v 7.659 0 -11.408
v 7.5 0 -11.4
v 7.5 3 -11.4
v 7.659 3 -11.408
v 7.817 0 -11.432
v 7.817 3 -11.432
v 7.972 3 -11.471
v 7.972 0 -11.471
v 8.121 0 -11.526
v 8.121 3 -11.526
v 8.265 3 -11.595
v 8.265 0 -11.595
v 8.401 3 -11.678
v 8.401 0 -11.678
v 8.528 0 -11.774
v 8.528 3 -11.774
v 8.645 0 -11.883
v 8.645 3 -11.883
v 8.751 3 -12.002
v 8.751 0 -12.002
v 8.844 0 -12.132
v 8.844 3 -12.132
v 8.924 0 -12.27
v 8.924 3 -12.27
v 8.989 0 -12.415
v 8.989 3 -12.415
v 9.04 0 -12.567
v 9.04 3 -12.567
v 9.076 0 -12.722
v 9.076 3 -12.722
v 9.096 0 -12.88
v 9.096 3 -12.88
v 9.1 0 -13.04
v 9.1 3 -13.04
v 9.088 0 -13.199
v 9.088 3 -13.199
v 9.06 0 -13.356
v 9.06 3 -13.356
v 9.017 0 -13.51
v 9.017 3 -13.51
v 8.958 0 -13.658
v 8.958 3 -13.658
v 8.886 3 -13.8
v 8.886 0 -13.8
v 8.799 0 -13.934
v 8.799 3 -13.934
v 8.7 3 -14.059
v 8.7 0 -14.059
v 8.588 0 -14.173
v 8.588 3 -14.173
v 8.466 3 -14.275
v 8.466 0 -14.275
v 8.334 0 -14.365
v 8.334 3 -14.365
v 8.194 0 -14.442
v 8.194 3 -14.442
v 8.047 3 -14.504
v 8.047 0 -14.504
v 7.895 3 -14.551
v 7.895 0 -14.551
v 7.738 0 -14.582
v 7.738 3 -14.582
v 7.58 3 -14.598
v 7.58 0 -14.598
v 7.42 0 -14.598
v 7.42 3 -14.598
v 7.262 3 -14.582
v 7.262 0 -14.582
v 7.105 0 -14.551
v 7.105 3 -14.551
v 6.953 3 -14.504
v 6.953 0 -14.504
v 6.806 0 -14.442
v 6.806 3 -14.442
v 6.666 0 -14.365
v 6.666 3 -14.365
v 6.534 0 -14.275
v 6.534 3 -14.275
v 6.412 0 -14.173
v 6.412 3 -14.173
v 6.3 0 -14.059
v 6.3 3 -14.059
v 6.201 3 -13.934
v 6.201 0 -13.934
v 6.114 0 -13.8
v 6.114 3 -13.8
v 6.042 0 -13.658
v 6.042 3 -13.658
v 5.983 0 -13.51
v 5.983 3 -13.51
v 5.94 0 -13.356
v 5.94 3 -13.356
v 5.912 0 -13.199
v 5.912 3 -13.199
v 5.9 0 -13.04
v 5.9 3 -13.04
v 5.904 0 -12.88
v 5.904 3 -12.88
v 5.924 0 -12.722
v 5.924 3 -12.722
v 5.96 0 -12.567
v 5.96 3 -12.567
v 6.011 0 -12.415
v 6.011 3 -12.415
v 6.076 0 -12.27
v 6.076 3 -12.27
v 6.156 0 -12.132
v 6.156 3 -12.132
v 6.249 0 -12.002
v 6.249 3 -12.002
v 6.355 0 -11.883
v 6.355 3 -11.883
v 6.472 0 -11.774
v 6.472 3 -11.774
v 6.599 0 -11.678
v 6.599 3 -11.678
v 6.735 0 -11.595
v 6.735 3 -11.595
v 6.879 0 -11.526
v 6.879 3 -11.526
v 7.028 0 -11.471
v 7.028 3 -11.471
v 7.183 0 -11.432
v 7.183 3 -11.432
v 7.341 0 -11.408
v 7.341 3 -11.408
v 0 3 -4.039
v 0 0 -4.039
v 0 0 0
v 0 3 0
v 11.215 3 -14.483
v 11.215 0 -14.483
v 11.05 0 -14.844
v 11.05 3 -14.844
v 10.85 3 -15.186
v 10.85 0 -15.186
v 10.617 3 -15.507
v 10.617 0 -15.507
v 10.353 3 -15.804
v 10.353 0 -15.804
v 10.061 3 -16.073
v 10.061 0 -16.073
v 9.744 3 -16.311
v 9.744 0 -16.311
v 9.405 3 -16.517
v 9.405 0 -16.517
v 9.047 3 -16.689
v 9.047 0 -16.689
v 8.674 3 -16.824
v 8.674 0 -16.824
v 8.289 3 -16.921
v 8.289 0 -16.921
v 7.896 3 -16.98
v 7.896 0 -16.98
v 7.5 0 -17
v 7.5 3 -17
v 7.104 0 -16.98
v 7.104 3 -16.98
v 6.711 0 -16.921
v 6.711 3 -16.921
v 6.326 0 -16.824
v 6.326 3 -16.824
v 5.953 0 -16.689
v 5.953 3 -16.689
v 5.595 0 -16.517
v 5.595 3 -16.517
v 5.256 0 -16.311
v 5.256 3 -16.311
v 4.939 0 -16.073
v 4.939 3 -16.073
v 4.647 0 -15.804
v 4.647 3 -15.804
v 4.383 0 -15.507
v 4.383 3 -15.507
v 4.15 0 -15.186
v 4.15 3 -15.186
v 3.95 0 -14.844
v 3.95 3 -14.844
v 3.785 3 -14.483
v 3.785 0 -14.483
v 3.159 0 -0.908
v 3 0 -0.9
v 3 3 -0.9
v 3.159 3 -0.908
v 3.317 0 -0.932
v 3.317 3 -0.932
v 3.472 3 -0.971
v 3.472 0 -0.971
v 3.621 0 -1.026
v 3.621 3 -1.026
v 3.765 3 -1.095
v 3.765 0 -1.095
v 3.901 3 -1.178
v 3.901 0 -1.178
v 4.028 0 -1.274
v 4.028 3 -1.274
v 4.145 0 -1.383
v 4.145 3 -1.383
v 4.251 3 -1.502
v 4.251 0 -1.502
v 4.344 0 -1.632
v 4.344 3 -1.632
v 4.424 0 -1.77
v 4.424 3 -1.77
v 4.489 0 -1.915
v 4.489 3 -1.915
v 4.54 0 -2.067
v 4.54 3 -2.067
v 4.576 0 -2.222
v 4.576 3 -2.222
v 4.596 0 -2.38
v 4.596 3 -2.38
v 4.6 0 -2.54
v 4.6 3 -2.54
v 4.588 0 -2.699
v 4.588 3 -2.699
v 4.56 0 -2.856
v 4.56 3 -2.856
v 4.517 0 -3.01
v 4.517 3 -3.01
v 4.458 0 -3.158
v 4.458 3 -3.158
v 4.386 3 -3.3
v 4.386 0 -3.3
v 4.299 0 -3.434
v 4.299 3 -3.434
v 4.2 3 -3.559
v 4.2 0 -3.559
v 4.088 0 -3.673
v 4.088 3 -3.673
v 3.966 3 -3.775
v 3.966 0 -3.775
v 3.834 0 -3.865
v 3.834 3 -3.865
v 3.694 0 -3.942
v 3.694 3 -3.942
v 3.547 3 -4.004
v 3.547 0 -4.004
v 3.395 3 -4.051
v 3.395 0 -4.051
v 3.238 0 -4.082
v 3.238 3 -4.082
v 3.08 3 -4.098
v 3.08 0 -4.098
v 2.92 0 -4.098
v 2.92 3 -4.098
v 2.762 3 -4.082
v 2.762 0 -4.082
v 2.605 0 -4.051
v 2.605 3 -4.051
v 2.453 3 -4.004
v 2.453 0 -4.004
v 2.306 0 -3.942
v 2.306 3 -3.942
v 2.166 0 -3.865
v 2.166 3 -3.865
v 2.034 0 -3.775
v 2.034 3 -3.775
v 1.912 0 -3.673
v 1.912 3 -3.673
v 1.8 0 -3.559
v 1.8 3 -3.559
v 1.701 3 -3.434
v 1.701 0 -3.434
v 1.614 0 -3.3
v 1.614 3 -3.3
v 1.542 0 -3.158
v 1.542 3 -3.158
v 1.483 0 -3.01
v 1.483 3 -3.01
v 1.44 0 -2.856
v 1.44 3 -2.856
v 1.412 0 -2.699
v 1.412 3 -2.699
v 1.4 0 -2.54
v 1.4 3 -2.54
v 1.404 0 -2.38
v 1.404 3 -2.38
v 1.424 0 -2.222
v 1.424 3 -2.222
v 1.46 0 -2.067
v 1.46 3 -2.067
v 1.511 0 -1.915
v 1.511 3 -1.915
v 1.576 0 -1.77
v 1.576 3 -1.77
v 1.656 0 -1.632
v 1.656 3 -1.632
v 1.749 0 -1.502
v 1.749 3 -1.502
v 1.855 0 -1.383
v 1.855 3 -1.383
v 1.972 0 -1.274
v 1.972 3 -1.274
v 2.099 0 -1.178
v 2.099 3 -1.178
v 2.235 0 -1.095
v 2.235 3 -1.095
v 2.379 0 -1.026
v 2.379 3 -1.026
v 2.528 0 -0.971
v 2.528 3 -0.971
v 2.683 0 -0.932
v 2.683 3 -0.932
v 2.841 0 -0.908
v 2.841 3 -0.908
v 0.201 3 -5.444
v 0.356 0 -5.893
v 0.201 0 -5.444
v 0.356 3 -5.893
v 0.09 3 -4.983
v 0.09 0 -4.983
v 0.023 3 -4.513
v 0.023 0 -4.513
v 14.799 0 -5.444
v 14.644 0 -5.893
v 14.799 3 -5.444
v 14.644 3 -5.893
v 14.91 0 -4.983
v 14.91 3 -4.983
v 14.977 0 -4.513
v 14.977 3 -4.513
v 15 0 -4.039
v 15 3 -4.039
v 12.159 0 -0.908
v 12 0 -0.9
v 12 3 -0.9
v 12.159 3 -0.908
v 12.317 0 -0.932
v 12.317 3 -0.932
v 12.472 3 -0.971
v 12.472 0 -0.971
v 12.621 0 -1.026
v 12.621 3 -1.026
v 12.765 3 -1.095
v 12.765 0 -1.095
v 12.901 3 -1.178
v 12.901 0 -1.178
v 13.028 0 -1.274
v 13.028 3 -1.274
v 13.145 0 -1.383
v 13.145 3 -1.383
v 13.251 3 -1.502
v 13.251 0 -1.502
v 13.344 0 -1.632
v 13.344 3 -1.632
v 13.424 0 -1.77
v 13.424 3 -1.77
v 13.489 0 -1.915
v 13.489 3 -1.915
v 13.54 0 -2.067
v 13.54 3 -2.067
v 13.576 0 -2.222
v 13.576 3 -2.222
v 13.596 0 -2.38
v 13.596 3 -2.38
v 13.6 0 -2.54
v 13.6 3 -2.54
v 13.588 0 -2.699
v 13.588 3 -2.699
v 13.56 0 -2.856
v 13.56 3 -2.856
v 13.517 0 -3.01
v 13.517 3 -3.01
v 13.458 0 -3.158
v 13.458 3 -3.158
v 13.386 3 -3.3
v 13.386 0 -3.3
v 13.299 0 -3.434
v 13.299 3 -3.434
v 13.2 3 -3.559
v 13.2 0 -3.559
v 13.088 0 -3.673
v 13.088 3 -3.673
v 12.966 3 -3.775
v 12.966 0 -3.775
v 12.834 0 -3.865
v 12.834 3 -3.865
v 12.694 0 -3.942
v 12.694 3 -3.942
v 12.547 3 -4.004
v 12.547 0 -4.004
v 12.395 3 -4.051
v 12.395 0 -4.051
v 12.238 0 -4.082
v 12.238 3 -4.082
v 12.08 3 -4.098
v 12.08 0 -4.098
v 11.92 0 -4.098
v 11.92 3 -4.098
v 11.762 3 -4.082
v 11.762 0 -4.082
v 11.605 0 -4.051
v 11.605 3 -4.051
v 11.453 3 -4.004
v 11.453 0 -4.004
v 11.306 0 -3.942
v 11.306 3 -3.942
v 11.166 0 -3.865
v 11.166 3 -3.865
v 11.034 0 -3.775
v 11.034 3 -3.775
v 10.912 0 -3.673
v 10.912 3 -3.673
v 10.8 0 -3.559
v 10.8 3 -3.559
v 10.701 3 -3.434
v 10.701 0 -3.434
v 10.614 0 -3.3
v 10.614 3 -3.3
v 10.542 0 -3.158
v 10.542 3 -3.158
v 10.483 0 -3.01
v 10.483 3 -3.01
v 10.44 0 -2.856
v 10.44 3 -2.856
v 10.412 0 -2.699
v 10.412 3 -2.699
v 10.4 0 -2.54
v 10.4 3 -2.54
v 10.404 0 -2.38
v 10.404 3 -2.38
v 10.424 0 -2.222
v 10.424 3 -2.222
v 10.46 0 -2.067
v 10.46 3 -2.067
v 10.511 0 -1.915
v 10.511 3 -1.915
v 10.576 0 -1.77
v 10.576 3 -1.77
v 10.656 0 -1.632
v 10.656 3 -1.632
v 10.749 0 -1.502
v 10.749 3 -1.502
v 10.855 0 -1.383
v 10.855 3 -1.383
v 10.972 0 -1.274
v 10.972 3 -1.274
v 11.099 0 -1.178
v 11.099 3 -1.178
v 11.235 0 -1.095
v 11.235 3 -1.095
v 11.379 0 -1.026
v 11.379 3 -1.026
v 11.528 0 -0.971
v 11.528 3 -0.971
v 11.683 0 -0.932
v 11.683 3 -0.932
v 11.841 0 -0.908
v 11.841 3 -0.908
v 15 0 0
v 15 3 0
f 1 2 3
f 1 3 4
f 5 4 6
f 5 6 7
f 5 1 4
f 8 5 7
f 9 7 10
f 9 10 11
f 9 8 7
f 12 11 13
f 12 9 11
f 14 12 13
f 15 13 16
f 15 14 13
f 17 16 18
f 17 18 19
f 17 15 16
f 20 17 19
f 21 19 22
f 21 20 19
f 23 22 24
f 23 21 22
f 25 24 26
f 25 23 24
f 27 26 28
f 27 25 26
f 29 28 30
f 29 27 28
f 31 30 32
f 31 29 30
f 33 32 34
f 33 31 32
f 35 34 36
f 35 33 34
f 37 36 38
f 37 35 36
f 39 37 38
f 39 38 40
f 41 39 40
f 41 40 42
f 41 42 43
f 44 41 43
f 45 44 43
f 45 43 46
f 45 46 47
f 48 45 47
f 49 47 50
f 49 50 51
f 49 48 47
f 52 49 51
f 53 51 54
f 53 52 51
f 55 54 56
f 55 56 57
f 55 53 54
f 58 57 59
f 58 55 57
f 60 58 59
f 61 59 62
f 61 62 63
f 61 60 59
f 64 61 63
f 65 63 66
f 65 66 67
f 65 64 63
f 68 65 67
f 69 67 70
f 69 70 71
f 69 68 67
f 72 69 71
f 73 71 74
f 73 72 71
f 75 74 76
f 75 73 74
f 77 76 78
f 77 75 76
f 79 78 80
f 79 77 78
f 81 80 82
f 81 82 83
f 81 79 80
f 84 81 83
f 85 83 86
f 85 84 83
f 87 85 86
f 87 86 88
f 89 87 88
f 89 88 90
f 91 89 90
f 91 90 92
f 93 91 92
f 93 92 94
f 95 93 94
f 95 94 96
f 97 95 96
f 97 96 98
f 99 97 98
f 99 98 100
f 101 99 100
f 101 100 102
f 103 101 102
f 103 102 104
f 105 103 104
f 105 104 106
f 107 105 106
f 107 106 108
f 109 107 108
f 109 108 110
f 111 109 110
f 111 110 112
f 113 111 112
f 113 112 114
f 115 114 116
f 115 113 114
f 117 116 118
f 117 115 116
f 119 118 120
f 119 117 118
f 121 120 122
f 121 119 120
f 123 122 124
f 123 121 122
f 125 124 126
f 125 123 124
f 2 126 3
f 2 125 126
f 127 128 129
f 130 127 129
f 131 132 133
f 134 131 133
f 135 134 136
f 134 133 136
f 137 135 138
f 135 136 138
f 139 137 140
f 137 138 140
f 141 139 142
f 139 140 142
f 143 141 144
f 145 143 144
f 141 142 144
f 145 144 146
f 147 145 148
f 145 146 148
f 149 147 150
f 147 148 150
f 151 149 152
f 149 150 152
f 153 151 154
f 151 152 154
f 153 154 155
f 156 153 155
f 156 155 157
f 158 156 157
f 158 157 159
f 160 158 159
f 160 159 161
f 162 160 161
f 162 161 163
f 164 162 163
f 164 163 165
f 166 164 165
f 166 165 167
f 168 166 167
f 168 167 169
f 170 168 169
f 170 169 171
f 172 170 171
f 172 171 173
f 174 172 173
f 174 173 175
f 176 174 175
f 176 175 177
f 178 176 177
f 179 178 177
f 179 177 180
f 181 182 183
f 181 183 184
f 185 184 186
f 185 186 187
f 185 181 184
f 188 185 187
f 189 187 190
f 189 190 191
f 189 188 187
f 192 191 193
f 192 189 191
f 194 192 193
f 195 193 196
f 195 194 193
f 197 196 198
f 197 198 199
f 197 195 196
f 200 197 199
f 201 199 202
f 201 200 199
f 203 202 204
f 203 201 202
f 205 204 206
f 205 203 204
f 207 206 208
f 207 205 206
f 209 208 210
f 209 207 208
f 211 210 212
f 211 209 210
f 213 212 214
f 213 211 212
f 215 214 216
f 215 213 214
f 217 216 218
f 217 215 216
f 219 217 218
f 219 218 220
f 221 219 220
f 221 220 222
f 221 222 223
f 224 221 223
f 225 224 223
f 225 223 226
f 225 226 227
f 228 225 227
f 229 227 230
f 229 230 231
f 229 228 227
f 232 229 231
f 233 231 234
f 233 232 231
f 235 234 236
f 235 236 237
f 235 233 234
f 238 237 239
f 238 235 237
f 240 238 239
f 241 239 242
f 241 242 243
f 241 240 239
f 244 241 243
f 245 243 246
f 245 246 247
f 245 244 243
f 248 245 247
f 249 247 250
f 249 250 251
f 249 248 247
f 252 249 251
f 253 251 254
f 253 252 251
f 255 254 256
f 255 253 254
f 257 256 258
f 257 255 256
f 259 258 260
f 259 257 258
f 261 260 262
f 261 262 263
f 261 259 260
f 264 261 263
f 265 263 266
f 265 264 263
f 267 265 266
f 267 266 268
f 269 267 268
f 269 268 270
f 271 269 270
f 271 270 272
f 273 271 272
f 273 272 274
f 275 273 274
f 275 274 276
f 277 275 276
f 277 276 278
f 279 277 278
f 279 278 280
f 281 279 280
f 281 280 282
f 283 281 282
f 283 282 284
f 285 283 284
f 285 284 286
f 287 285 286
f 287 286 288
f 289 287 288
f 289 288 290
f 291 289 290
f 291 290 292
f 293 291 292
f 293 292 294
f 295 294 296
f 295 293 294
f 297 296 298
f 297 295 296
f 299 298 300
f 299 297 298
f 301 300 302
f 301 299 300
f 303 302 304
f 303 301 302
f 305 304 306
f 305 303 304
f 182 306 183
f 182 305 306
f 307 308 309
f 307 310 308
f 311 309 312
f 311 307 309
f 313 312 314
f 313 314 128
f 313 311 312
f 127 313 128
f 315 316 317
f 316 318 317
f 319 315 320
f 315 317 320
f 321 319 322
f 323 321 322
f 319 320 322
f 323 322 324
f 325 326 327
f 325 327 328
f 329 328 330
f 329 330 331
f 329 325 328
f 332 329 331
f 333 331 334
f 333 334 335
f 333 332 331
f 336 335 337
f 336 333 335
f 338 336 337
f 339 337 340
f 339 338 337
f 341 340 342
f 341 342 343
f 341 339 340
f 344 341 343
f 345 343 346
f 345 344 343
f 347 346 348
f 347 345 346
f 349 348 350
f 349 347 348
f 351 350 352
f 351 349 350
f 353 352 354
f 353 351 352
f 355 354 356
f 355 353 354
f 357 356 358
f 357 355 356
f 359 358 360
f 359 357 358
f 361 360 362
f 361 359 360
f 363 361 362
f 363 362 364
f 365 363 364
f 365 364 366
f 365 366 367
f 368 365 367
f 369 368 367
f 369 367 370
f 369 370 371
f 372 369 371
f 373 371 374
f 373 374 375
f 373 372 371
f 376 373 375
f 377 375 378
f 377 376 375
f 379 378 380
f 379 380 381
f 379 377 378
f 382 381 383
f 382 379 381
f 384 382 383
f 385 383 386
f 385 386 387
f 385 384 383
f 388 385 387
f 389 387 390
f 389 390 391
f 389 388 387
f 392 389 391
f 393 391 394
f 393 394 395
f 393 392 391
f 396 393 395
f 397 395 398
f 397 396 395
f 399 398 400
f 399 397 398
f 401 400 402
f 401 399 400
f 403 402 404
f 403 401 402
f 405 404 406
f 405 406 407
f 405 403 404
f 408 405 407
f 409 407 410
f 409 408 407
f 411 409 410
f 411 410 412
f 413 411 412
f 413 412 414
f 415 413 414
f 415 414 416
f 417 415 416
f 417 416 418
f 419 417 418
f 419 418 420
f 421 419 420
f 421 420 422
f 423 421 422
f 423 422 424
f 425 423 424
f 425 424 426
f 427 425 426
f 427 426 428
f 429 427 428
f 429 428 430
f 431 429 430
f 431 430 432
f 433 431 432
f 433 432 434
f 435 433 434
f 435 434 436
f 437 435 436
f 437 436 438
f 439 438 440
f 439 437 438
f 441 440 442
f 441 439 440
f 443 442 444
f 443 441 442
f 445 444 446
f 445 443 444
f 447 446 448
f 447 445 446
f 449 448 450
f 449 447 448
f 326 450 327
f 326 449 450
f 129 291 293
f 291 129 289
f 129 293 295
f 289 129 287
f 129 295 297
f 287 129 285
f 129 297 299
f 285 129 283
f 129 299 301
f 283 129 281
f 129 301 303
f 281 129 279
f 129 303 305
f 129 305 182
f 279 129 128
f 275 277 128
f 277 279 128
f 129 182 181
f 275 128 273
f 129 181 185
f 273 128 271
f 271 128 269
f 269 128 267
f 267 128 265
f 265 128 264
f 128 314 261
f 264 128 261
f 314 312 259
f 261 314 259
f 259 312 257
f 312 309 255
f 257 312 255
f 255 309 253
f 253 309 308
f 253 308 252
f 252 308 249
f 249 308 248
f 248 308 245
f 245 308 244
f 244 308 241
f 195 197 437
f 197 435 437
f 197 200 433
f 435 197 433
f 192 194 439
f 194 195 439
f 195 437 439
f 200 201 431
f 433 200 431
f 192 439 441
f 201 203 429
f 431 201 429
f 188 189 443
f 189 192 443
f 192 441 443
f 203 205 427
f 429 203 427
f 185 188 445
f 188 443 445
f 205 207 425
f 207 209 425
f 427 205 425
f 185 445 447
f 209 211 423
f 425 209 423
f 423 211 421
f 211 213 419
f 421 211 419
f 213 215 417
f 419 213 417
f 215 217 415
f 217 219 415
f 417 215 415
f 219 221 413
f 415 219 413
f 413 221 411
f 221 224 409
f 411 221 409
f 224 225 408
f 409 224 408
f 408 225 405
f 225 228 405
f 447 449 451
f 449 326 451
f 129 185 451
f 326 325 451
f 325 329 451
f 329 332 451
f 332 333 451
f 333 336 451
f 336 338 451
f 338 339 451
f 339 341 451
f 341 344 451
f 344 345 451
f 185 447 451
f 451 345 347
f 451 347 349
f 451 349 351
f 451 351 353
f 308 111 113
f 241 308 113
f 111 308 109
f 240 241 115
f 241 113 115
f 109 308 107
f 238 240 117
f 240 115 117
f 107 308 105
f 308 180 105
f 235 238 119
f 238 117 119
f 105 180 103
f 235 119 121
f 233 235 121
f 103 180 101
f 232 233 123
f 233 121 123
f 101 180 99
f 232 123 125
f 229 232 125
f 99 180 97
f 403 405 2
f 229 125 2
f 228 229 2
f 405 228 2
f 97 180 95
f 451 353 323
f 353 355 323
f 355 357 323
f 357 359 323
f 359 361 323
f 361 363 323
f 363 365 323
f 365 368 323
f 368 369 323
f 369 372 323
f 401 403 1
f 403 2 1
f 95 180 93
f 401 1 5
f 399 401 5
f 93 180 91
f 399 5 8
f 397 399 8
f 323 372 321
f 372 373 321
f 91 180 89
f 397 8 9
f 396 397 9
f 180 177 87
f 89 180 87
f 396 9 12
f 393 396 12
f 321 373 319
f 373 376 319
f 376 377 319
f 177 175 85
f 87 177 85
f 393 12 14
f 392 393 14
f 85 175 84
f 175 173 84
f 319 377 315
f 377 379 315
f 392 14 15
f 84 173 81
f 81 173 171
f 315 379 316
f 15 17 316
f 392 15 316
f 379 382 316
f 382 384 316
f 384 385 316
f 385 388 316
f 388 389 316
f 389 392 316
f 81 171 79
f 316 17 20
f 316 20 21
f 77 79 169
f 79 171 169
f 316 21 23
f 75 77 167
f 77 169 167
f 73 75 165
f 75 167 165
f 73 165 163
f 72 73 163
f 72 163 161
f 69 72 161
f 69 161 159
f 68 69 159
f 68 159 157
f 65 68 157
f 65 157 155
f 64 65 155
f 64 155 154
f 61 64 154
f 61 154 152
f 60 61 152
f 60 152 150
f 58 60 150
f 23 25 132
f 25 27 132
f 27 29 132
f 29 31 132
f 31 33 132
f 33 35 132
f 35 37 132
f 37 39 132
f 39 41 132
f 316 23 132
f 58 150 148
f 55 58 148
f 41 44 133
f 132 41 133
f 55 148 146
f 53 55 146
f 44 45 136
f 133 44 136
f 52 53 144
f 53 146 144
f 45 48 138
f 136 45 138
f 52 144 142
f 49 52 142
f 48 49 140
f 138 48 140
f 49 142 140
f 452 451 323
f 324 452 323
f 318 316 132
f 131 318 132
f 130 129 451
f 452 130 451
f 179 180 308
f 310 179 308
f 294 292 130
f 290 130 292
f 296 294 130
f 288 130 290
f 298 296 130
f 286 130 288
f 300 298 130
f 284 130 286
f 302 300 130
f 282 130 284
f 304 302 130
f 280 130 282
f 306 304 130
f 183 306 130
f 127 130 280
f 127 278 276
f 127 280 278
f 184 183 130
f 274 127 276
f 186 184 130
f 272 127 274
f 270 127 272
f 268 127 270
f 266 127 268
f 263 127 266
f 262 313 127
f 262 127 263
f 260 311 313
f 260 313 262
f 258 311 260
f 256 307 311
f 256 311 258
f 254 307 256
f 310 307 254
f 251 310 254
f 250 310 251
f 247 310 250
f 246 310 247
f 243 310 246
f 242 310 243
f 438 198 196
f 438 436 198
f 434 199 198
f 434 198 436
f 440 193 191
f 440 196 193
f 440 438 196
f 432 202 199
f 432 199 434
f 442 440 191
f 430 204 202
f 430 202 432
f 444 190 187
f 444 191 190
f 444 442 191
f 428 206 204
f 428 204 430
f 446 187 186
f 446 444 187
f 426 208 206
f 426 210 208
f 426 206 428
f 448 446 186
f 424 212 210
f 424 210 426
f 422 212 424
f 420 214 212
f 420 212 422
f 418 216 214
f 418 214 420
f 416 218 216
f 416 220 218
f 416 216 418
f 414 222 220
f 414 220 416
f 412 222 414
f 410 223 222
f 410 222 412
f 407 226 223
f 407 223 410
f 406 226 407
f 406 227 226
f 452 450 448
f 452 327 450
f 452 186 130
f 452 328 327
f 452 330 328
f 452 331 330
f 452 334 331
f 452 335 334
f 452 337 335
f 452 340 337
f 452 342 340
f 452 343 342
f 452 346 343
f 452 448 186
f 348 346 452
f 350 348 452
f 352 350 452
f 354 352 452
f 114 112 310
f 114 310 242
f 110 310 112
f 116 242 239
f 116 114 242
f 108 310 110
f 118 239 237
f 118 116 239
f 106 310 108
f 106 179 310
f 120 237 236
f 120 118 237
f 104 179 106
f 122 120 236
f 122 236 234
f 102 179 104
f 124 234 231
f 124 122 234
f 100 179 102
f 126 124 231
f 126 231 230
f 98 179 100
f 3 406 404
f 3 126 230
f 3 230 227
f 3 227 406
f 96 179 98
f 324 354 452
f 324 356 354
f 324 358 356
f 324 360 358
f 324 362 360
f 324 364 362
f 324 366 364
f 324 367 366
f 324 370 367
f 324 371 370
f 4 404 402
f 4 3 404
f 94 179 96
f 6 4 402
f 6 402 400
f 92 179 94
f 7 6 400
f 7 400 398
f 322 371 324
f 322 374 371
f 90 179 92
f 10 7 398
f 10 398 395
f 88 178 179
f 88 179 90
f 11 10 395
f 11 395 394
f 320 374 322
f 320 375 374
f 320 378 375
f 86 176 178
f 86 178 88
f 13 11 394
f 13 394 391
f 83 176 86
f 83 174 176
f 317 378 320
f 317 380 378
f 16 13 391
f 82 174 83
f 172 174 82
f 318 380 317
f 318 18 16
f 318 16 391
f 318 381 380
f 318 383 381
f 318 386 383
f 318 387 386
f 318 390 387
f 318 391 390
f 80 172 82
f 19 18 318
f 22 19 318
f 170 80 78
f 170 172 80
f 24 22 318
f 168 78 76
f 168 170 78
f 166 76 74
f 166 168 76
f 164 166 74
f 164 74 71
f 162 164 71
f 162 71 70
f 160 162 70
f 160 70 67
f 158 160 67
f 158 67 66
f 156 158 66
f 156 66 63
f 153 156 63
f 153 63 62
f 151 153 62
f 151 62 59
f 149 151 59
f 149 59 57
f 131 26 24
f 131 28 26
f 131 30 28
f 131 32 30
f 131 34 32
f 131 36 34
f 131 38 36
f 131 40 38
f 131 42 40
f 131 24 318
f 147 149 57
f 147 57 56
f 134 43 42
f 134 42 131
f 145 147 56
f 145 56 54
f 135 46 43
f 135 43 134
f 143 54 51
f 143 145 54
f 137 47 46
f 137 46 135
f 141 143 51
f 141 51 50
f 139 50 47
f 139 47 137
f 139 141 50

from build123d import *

# Parameters (mm, degrees)
SKETCH1_R           = 1.6
SKETCH1_R_2         = 4
BOSS_EXTRUDE1_DEPTH = 3
FILLET1_R           = 5


with BuildPart() as part:
    # Sketch1 → Boss-Extrude1 (new body)
    # profile 1 of 2: a face of its own
    with BuildSketch(Plane(origin=(0, 0, 0), x_dir=(1, 0, 0), z_dir=(0, 1, 0))):
        with BuildLine():
            Line((0, 5), (0, 0))
            Line((0, 0), (15, 0))
            Line((15, 0), (15, 5))
            Line((15, 5), (11.215004122, 14.482816365))
            ThreePointArc((11.215004122, 14.482816365), (11.428104918, 13.754977983), (11.5, 13))
            ThreePointArc((11.5, 13), (6.745022017, 9.071895082), (3.784995878, 14.482816365))
            Line((3.784995878, 14.482816365), (0, 5))
        make_face()
        with Locations(Location((3, 2.5, 0), (0, 0, 270))):
            Circle(SKETCH1_R, mode=Mode.SUBTRACT)
        with Locations(Location((12, 2.5, 0), (0, 0, 270))):
            Circle(SKETCH1_R, mode=Mode.SUBTRACT)
    # profile 2 of 2: a face of its own
    with BuildSketch(Plane(origin=(0, 0, 0), x_dir=(1, 0, 0), z_dir=(0, 1, 0))):
        with Locations((7.5, 13)):
            Circle(SKETCH1_R_2)
        with Locations(Location((7.5, 13, 0), (0, 0, 270))):
            Circle(SKETCH1_R, mode=Mode.SUBTRACT)
    extrude(amount=BOSS_EXTRUDE1_DEPTH)

    # Fillet1
    fillet1_edges = [part.edges().sort_by_distance(p)[0] for p in [
        (15, 1.5, -5),
        (0, 1.5, -5),
    ]]
    fillet(fillet1_edges, radius=FILLET1_R)


solid = part.part
